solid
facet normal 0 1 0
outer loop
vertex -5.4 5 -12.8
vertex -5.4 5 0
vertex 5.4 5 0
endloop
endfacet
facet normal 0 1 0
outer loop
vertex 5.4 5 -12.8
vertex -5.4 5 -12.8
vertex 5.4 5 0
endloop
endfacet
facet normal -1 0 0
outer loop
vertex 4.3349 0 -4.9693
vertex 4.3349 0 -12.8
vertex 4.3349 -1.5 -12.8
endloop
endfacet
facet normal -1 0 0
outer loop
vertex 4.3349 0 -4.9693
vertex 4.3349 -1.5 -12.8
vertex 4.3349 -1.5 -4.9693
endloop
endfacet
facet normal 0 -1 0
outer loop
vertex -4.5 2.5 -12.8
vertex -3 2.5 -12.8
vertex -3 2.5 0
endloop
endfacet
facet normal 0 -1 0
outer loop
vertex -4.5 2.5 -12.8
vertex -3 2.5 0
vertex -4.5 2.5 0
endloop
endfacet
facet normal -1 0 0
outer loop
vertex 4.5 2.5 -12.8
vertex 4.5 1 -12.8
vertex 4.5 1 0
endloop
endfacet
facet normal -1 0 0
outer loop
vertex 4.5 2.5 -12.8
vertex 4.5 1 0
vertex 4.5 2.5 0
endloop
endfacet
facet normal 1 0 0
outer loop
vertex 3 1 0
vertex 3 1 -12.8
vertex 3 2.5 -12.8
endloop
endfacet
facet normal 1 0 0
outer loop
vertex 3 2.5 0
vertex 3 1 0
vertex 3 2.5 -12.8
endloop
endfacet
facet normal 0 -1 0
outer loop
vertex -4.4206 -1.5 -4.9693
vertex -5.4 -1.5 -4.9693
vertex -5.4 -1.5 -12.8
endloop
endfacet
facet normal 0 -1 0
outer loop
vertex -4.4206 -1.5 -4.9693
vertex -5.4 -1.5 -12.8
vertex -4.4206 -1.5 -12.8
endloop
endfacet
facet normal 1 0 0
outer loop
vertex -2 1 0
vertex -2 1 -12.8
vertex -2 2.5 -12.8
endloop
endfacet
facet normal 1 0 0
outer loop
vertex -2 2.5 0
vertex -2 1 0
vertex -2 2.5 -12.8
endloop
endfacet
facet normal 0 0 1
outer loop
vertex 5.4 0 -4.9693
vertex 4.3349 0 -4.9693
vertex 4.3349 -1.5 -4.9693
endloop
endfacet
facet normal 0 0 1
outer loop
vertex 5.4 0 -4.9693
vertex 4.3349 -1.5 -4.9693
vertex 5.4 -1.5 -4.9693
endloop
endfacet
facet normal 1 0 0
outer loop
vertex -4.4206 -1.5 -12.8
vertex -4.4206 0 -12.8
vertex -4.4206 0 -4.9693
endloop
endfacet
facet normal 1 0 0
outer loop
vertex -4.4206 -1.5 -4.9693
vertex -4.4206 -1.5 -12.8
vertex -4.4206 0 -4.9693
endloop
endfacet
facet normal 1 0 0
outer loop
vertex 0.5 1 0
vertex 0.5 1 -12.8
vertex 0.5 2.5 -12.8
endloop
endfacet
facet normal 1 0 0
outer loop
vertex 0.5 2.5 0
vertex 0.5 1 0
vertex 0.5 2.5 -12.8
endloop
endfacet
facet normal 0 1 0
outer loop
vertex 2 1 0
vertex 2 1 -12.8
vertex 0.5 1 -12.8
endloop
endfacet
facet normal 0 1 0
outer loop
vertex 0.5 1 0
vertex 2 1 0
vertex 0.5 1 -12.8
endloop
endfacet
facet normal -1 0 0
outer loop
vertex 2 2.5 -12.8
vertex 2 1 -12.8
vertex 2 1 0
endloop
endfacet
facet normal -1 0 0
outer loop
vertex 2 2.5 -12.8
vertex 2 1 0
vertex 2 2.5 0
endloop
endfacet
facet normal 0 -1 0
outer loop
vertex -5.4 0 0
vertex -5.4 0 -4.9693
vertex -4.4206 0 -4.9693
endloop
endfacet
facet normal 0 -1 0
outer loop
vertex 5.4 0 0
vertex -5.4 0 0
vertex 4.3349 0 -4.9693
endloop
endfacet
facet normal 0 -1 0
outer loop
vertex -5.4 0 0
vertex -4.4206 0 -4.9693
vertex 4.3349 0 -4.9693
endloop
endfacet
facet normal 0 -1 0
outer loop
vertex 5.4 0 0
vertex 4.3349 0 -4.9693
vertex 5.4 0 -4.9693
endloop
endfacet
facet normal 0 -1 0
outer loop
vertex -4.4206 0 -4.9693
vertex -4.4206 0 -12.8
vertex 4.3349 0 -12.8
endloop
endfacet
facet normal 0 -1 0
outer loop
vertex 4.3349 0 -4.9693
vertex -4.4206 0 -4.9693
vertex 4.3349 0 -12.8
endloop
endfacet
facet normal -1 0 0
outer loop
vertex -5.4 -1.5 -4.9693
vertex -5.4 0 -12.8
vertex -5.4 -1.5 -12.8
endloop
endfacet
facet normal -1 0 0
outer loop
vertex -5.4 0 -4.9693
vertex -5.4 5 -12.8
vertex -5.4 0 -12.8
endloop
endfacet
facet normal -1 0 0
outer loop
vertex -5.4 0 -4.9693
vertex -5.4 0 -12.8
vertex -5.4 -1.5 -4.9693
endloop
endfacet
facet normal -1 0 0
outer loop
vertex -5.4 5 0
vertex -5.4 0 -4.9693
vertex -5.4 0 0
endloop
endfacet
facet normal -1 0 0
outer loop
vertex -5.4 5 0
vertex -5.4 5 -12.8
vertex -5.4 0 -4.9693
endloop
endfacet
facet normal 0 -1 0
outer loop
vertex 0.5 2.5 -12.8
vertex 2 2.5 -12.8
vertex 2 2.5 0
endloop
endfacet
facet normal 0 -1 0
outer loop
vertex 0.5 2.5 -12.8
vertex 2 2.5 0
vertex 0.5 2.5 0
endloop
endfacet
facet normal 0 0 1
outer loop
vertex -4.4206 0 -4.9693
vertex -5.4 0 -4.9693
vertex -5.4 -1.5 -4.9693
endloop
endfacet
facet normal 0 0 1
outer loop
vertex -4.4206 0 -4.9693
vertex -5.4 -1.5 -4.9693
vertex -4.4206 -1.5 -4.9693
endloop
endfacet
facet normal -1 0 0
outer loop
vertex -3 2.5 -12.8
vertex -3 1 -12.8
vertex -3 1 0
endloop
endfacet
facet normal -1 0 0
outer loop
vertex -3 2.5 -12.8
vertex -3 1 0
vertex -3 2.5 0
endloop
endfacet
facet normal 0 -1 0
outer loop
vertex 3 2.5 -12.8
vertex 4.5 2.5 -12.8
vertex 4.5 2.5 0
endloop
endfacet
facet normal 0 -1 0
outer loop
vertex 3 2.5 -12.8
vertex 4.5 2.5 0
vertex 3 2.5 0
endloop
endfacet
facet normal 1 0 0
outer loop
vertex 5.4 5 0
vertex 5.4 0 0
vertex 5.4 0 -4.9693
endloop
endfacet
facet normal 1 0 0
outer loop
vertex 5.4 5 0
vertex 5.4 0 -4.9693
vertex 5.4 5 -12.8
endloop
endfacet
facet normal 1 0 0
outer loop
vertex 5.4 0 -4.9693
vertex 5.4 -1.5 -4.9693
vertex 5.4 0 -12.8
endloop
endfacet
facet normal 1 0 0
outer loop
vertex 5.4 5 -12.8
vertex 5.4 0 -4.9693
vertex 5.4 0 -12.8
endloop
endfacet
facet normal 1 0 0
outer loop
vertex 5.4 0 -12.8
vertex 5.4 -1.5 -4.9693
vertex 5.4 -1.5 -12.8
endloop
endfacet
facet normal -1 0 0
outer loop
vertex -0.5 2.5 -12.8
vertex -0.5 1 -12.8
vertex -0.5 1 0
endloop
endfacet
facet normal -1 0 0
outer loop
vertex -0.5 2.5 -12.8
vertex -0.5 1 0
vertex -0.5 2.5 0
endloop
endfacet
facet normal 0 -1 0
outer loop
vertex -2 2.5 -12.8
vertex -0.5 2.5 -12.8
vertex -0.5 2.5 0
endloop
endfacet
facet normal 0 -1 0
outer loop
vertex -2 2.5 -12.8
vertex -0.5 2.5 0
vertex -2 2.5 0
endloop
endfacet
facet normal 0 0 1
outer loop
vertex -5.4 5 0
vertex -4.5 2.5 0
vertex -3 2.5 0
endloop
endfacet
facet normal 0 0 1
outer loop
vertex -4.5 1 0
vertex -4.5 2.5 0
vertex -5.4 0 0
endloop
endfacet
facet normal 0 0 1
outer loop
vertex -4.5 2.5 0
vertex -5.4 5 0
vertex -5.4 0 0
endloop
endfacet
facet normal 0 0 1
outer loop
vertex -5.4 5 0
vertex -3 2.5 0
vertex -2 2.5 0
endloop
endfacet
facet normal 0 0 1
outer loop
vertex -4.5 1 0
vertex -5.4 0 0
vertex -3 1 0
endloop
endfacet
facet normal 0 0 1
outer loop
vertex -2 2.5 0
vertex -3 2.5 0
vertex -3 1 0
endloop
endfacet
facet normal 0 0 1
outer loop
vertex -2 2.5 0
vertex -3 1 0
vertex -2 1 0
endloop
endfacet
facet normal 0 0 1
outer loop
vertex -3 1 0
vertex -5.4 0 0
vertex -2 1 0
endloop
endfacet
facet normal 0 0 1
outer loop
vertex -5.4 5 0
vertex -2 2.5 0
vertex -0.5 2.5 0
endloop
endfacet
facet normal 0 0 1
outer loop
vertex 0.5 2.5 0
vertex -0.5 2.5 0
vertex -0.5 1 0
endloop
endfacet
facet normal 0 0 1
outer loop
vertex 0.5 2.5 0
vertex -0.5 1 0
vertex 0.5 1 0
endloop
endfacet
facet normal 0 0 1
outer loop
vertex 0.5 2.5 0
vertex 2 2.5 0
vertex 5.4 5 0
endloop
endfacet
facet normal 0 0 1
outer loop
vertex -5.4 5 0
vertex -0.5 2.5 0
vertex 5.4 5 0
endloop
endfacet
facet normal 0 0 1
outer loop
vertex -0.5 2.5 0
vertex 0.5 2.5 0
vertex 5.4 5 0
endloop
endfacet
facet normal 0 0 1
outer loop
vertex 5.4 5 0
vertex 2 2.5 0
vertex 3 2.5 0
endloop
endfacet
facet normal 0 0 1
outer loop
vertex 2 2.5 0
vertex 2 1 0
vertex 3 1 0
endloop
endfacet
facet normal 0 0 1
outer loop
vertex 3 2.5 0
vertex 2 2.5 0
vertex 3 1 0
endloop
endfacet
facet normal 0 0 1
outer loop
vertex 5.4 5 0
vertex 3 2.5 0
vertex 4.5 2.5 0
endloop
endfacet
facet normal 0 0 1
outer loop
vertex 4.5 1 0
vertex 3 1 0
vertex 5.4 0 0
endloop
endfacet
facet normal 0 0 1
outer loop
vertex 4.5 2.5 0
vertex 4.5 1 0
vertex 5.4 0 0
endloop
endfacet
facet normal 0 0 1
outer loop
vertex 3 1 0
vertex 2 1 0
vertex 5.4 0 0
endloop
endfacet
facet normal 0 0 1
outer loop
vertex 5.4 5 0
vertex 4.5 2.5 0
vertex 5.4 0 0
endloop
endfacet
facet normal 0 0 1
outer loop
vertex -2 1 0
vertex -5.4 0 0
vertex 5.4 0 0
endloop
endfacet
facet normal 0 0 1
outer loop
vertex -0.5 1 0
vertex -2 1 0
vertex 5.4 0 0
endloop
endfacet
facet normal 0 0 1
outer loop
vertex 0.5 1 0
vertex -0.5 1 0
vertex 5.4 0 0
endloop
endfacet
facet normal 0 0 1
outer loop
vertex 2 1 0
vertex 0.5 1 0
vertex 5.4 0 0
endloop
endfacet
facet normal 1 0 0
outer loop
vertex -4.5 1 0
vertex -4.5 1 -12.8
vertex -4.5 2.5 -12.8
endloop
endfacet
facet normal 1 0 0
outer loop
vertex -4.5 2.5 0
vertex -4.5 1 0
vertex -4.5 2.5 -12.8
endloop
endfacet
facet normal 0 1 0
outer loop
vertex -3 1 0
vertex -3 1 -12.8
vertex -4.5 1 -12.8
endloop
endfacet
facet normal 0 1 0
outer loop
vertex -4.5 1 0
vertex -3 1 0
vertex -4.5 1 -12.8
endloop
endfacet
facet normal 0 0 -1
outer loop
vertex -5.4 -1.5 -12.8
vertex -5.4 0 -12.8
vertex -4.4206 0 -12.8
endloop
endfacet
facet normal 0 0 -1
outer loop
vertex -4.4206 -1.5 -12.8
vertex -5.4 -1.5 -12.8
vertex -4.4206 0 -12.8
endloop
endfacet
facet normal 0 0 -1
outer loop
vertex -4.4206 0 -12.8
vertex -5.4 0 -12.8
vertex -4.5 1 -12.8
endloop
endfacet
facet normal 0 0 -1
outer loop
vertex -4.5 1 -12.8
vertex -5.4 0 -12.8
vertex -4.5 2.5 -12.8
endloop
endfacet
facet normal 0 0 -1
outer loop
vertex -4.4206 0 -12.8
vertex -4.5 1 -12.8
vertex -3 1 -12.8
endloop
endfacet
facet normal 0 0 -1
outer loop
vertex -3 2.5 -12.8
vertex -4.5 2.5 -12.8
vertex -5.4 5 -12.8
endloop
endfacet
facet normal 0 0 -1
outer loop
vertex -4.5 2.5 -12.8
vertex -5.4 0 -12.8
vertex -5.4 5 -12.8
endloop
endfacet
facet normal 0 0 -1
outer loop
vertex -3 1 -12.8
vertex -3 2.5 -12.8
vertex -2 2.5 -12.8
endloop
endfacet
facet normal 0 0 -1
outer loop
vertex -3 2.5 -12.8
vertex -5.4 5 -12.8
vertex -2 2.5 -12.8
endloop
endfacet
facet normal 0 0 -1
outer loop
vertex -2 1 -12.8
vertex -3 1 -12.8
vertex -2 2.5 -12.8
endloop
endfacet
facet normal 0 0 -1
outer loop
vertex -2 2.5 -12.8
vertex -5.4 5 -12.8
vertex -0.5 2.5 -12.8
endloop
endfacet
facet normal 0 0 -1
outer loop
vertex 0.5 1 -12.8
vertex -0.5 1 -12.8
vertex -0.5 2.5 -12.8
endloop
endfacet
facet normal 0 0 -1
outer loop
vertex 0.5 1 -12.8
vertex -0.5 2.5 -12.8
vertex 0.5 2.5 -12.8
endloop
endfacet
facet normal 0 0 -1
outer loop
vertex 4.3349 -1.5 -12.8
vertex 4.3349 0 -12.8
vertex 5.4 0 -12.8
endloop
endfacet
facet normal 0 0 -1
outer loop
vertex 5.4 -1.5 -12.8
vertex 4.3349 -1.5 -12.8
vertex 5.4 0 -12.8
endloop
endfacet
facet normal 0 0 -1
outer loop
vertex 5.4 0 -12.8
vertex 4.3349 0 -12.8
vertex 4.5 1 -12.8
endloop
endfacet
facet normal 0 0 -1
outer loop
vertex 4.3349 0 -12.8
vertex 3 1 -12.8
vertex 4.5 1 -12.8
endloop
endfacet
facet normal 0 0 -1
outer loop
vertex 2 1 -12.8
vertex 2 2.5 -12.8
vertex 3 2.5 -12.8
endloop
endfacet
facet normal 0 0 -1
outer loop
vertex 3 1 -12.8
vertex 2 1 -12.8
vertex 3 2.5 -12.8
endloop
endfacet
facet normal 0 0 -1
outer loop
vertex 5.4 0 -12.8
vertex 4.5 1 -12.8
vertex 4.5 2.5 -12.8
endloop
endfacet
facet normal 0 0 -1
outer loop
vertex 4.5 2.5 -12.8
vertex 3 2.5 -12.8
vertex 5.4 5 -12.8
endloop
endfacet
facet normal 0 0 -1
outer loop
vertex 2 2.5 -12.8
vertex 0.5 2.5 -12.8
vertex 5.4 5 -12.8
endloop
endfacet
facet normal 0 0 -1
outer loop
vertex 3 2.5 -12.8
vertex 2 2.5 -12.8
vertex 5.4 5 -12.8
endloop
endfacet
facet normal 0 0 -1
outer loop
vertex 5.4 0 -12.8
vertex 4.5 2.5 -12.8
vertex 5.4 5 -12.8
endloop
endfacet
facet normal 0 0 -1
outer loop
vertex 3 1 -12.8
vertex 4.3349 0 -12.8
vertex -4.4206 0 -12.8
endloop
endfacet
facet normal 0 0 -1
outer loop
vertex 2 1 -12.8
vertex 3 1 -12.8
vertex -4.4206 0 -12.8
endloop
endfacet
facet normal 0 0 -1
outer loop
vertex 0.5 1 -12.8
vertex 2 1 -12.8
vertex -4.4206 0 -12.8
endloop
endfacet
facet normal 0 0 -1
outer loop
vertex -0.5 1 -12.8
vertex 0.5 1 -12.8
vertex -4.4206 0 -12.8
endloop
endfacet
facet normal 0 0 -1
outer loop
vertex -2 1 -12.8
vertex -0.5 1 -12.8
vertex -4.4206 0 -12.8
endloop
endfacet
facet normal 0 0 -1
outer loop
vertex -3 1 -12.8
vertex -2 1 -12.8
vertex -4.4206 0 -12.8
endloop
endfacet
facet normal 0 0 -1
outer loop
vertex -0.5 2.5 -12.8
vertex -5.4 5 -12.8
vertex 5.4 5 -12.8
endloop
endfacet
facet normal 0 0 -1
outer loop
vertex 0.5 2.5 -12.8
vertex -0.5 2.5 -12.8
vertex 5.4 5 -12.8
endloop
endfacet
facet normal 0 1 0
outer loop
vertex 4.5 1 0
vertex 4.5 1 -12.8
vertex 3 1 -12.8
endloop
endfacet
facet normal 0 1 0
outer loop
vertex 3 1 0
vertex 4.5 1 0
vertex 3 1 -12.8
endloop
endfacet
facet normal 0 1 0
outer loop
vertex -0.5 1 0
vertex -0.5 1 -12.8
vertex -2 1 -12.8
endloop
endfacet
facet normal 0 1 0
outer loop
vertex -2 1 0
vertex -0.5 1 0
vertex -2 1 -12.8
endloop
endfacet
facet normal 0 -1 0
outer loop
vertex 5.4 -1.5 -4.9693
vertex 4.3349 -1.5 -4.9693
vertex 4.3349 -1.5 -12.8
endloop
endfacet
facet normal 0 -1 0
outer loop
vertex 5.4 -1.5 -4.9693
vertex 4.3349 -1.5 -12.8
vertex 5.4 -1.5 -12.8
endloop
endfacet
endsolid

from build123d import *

# Parameters (mm, degrees)
SKETCH_1_W          = 10.8
SKETCH_1_H          = 12.8
EXTRUDE_1_DEPTH     = 5
SKETCH_2_W          = 1.5
SKETCH_2_H          = 1.5
CUT_EXTRUDE_1_DEPTH = 13.8
SKETCH_3_W          = 0.979411712
SKETCH_3_H          = 7.830694271
SKETCH_3_W_2        = 1.065082028
EXTRUDE_2_DEPTH     = 1.5


with BuildPart() as part:
    # 草圖1 → 填料-伸長1 (new body)
    with BuildSketch(Plane(origin=(0, 0, 0), x_dir=(1, 0, 0), z_dir=(0, 1, 0))):
        with Locations((0, 6.4)):
            Rectangle(SKETCH_1_W, SKETCH_1_H)
    extrude(amount=EXTRUDE_1_DEPTH)

    # 草圖2 → 除料-伸長1 (cut, through all)
    with BuildSketch(Plane(origin=(0, 0, -12.8), x_dir=(-1, 0, 0), z_dir=(0, 0, -1))):
        with Locations((-3.75, 1.75)):
            Rectangle(SKETCH_2_W, SKETCH_2_H)
        with Locations((-1.25, 1.75)):
            Rectangle(SKETCH_2_W, SKETCH_2_H)
        with Locations((1.25, 1.75)):
            Rectangle(SKETCH_2_W, SKETCH_2_H)
        with Locations((3.75, 1.75)):
            Rectangle(SKETCH_2_W, SKETCH_2_H)
    extrude(amount=-CUT_EXTRUDE_1_DEPTH, mode=Mode.SUBTRACT)

    # 草圖3 → 填料-伸長2 (add)
    with BuildSketch(Plane.XZ):
        with Locations((-4.910294144, -8.884652865)):
            Rectangle(SKETCH_3_W, SKETCH_3_H)
        with Locations((4.867458986, -8.884652865)):
            Rectangle(SKETCH_3_W_2, SKETCH_3_H)
    extrude(amount=EXTRUDE_2_DEPTH)


solid = part.part
